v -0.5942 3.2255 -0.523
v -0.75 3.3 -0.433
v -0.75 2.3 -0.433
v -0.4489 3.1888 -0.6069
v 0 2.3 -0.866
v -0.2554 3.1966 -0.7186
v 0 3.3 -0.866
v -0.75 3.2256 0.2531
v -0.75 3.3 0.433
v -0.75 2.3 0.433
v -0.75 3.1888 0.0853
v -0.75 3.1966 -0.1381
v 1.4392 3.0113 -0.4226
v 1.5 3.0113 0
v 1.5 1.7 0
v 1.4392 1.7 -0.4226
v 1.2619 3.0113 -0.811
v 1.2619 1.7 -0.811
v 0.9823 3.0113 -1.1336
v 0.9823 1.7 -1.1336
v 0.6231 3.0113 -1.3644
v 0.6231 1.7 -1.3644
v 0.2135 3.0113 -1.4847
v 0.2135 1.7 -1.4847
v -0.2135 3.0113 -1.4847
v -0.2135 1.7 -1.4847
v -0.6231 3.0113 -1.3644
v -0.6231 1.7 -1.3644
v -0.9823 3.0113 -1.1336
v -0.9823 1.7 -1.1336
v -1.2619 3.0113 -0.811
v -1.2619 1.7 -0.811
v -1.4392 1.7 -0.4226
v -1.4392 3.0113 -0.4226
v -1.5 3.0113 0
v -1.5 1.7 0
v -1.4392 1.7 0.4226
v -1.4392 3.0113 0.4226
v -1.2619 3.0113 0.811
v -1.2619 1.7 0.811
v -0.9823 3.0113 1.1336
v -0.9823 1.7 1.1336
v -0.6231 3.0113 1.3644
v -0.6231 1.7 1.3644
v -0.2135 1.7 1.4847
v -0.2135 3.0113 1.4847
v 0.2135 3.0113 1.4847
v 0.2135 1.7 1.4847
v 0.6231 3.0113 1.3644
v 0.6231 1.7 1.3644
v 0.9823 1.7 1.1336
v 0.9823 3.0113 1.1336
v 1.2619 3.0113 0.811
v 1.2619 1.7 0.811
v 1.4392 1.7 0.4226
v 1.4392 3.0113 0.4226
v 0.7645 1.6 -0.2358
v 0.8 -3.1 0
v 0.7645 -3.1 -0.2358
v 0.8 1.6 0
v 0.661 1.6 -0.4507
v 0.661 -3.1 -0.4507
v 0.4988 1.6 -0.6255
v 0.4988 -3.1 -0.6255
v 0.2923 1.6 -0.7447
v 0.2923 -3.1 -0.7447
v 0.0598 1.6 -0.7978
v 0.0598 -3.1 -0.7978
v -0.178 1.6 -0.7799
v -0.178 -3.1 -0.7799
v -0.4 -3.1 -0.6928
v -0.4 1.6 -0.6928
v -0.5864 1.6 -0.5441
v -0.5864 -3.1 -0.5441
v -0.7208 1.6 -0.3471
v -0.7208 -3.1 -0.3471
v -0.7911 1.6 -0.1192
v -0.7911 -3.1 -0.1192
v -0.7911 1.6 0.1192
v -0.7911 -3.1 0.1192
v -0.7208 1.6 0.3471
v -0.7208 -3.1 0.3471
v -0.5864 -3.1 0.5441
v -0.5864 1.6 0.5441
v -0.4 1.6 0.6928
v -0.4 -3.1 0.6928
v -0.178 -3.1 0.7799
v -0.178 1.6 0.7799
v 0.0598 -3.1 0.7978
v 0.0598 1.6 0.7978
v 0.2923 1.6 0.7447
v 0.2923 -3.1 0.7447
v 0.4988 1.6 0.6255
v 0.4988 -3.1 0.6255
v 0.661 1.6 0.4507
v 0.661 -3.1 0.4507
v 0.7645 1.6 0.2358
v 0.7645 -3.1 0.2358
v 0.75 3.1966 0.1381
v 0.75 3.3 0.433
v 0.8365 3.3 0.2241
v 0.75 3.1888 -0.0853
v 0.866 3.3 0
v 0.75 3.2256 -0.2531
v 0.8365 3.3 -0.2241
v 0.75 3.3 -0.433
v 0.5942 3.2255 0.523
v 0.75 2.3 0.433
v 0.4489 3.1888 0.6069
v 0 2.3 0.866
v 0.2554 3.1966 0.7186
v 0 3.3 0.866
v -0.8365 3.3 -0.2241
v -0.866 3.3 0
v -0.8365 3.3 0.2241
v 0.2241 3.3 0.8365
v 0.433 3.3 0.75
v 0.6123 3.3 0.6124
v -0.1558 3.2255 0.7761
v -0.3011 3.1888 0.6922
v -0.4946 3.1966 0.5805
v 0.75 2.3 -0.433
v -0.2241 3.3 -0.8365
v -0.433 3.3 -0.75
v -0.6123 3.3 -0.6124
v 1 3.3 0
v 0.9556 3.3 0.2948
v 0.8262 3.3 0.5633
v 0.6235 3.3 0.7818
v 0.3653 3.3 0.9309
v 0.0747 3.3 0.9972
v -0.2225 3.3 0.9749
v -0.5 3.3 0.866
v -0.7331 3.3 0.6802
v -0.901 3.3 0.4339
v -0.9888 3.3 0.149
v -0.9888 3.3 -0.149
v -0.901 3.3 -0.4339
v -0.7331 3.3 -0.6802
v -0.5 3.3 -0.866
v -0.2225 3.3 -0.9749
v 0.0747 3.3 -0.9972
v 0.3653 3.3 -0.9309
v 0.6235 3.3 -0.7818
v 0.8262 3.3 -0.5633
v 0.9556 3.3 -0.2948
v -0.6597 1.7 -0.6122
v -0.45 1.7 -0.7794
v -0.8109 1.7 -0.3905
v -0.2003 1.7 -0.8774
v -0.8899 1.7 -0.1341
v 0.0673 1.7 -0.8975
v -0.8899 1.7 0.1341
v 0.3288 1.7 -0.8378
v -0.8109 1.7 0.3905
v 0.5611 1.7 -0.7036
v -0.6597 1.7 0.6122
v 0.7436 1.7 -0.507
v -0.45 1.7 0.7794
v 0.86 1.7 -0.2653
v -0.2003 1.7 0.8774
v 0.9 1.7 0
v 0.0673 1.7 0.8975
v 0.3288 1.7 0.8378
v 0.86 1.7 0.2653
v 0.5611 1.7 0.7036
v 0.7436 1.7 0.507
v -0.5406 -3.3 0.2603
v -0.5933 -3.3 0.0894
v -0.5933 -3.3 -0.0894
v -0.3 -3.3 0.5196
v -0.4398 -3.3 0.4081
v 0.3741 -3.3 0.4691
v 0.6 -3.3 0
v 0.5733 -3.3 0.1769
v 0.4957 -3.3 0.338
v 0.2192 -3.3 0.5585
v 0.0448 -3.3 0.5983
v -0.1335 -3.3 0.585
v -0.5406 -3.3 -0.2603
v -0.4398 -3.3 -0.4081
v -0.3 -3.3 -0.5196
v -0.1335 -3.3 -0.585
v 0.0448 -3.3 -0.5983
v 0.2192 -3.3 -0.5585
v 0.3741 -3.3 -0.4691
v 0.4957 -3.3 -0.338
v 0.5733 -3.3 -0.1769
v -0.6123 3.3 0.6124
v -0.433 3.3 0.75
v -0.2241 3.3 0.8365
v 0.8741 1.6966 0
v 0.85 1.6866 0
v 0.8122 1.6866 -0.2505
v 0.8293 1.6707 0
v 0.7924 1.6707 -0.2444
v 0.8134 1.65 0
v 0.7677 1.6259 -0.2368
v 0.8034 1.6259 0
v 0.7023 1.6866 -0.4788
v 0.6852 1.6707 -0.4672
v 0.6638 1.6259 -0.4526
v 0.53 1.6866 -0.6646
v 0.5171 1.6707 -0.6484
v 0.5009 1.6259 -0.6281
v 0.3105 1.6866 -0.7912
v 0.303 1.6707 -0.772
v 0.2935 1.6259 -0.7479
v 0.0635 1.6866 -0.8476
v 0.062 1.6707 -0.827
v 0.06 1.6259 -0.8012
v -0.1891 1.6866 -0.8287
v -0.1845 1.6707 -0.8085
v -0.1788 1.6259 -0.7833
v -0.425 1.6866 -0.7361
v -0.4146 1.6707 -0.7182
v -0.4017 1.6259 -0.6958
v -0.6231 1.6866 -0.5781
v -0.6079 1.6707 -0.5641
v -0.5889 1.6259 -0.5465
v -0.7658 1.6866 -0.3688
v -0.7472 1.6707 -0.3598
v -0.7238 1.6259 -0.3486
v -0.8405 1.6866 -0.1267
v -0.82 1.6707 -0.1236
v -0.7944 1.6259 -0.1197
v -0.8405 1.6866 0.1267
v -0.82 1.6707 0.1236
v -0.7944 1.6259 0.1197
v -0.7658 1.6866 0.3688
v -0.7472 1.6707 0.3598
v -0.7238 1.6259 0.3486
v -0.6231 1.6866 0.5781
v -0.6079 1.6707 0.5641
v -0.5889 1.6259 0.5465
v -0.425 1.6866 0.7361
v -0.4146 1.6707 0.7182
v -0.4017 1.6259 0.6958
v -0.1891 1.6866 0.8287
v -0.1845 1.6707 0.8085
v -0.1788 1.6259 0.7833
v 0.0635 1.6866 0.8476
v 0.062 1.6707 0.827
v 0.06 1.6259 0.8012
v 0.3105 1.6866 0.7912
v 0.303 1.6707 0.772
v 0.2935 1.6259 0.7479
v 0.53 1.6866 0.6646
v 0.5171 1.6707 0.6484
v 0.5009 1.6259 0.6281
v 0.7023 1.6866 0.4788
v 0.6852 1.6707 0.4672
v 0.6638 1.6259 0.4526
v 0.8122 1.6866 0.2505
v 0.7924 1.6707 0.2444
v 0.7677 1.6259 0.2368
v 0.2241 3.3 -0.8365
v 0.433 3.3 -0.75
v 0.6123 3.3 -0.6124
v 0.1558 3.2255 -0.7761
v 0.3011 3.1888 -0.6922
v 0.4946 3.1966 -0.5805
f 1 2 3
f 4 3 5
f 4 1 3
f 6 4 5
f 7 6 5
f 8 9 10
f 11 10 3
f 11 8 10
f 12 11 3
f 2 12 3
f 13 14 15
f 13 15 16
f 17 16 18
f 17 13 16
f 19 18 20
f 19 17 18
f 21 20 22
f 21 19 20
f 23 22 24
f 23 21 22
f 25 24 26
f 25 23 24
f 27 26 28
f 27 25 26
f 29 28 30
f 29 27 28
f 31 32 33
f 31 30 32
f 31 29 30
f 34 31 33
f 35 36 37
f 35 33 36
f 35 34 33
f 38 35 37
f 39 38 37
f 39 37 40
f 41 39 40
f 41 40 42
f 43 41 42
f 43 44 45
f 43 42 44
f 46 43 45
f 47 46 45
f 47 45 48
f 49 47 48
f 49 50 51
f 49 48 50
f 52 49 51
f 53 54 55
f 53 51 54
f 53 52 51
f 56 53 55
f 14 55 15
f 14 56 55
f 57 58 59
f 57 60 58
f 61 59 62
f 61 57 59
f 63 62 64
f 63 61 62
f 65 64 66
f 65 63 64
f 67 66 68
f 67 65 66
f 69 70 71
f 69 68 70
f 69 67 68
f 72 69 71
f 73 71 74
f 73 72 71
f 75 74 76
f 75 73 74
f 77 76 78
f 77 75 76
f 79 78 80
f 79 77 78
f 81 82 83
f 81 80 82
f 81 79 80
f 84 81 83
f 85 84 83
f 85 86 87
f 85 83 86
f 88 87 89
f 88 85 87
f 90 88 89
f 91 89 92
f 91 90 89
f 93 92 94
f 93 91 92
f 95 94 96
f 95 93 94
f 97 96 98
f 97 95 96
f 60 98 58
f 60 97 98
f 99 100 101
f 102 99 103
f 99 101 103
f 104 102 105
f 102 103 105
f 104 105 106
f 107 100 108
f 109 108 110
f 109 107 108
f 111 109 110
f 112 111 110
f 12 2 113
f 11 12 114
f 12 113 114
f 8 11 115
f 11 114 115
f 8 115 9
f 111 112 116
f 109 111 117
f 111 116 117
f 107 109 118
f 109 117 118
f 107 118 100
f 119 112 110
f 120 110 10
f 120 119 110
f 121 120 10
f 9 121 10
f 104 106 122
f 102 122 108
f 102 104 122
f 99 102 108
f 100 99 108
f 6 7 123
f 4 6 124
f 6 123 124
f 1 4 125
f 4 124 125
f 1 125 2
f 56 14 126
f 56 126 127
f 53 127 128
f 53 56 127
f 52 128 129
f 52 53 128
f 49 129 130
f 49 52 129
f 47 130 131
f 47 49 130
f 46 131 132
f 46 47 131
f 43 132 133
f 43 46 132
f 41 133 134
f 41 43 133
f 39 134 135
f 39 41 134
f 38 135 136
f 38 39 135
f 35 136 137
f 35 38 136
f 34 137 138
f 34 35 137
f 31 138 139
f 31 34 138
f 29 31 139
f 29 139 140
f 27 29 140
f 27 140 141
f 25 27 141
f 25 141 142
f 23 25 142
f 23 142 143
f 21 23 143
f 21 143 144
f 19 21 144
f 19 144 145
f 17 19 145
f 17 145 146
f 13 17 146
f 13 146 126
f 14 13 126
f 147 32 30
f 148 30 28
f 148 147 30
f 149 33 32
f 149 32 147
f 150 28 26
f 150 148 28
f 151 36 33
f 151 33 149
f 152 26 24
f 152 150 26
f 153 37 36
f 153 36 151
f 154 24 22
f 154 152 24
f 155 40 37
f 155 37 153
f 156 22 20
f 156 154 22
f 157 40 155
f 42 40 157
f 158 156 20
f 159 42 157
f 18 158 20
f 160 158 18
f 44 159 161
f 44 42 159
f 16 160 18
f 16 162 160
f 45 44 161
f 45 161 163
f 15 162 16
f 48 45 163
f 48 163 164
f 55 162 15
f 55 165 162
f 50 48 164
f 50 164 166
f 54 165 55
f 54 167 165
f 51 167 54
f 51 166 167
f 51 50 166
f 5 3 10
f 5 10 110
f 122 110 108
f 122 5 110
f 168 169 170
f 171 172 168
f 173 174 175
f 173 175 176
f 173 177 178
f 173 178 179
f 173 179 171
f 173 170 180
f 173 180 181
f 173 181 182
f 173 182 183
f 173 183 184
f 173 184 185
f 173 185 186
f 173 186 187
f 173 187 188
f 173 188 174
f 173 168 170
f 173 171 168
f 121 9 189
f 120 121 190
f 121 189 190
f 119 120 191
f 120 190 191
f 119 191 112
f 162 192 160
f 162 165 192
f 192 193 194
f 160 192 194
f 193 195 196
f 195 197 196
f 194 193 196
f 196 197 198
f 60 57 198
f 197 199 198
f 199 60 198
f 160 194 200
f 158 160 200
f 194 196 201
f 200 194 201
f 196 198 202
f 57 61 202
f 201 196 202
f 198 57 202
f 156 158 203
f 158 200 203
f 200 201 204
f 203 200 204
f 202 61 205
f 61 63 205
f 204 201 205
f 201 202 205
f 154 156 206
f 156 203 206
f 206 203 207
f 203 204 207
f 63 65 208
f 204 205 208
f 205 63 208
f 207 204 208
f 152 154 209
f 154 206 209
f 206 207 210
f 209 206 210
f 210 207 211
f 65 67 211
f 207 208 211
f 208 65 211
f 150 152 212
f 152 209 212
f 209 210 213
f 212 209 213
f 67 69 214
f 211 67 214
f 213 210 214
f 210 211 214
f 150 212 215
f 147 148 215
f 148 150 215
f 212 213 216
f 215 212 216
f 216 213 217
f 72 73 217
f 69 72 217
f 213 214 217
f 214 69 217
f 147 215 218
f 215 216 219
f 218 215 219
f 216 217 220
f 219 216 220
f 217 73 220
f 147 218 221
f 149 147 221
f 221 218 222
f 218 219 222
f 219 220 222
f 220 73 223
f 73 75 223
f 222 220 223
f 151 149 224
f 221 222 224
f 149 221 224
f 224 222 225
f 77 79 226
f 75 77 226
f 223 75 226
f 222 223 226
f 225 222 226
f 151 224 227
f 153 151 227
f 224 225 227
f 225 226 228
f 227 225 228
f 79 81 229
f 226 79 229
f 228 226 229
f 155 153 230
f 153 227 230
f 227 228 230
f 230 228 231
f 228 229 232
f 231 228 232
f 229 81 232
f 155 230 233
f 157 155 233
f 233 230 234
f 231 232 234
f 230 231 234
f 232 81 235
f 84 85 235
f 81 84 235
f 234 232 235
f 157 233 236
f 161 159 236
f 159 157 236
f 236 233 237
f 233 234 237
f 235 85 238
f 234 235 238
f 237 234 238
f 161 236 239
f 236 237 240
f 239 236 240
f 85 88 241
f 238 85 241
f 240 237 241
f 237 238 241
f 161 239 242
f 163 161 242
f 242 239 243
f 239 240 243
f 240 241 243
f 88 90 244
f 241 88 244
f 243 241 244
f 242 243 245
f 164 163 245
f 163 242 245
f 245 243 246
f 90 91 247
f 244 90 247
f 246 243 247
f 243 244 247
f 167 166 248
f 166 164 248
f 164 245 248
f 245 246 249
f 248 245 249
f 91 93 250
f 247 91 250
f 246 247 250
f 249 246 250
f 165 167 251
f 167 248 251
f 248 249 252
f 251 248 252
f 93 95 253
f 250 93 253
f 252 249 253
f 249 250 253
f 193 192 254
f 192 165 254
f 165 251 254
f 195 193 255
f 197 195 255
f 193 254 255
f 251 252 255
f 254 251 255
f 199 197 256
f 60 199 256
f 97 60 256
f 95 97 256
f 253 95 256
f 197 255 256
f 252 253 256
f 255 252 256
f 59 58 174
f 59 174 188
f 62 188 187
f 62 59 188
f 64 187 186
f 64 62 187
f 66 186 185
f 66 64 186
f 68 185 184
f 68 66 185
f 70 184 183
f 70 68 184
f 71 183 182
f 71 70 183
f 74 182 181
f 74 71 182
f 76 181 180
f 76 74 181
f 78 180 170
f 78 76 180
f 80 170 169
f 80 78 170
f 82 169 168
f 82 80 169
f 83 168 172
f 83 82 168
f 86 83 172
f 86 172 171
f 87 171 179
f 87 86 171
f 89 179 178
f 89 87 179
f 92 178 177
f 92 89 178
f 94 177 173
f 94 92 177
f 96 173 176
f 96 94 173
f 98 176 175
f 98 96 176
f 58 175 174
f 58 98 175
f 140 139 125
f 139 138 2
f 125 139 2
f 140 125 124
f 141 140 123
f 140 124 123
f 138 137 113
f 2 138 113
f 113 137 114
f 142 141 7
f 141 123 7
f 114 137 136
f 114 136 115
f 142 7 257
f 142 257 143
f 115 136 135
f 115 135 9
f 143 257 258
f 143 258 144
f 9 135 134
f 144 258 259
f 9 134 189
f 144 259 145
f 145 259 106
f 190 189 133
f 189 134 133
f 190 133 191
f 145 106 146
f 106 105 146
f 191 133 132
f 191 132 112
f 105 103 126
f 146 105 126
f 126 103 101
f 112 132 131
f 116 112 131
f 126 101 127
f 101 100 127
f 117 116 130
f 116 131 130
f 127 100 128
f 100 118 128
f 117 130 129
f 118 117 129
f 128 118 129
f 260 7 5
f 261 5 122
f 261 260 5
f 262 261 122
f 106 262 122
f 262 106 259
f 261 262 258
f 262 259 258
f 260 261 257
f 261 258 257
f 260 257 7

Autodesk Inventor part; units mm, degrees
ref_plane "YZ Plane" through (0, 0, 0) normal (1, 0, 0) x (0, 1, 0)
ref_plane "XZ Plane" through (0, 0, 0) normal (0, 1, 0) x (-1, 0, 0)
ref_plane "XY Plane" through (0, 0, 0) normal (0, 0, 1) x (1, 0, 0)
sketch "Sketch1" plane through (0, 0, 0) normal (0, 0, 1) x (1, 0, 0)
  line L0 (0, 3.3) -> (0, -3.3)
  line L1 (0, -3.3) -> (0.6, -3.3)
  line L2 (0.6, -3.3) -> (0.8, -3.1)
  line L3 (0.8, -3.1) -> (0.8, 1.6)
  line L4 (0.9, 1.7) -> (1.5, 1.7)
  line L5 (1.5, 1.7) -> (1.5, 3.0113)
  line L6 (1, 3.3) -> (0, 3.3)
  arc A0 (0.9, 1.7) -> (0.8, 1.6) centre (0.9, 1.6) ccw
  line L7 (1, 3.3) -> (1.5, 3.0113)
  point P0 (0, 0)
  point P1 (1.5, 3.3)
  point P2 (0, 0)
  dimension "d0" = 3
  dimension "d1" = 1.6
  dimension "d3" = 1.6
  dimension "d4" = 1.8
  dimension "d5" = 135
  dimension "d6" = 0.2
  dimension "d7" = 5
  dimension "d9" = 0.5
  dimension "d10" = 30
revolve "Revolution1" add sketch "Sketch1" angle 360 about axis through (0, 3.3, 0) along (0, -1, 0)
sketch "Sketch2" plane through (0, 3.3, 0) normal (0, 1, 0) x (1, 0, 0)
  line L0 (0, -0.866) -> (-0.75, -0.433)
  line L1 (-0.75, -0.433) -> (-0.75, 0.433)
  line L2 (-0.75, 0.433) -> (0, 0.866)
  line L3 (0, 0.866) -> (0.75, 0.433)
  line L4 (0.75, 0.433) -> (0.75, -0.433)
  line L5 (0.75, -0.433) -> (0, -0.866)
  point P0 (0, 0)
  point P1 (0, 0)
  dimension "d11" = 1.5
extrude "Extrusion1" cut sketch "Sketch2" against normal blind 1
thread "Thread1" size "M1.6x0.35" class "6g" standard "ANSI Metric M Profile" full length
sketch "Sketch3" plane through (0, 0, 0) normal (1, 0, 0) x (0, 1, 0)
  line L0 (3.3, 0.866) -> (2.8, 0.366)
  line L1 (2.8, 0.366) -> (3.3, 0.366)
  line L2 (3.3, 0.866) -> (3.3, 0.366)
  line L3 (-0.66, 0) -> (3.96, 0) projected
  point P0 (0, 0)
  dimension "d16" = 0.5
revolve "Revolution2" cut sketch "Sketch3" angle 360 about axis through (0, -10, 0) along (0, 1, 0)
properties part number "Bolt_M1.6x0.35_5mm_SH" material "Stainless Steel"
